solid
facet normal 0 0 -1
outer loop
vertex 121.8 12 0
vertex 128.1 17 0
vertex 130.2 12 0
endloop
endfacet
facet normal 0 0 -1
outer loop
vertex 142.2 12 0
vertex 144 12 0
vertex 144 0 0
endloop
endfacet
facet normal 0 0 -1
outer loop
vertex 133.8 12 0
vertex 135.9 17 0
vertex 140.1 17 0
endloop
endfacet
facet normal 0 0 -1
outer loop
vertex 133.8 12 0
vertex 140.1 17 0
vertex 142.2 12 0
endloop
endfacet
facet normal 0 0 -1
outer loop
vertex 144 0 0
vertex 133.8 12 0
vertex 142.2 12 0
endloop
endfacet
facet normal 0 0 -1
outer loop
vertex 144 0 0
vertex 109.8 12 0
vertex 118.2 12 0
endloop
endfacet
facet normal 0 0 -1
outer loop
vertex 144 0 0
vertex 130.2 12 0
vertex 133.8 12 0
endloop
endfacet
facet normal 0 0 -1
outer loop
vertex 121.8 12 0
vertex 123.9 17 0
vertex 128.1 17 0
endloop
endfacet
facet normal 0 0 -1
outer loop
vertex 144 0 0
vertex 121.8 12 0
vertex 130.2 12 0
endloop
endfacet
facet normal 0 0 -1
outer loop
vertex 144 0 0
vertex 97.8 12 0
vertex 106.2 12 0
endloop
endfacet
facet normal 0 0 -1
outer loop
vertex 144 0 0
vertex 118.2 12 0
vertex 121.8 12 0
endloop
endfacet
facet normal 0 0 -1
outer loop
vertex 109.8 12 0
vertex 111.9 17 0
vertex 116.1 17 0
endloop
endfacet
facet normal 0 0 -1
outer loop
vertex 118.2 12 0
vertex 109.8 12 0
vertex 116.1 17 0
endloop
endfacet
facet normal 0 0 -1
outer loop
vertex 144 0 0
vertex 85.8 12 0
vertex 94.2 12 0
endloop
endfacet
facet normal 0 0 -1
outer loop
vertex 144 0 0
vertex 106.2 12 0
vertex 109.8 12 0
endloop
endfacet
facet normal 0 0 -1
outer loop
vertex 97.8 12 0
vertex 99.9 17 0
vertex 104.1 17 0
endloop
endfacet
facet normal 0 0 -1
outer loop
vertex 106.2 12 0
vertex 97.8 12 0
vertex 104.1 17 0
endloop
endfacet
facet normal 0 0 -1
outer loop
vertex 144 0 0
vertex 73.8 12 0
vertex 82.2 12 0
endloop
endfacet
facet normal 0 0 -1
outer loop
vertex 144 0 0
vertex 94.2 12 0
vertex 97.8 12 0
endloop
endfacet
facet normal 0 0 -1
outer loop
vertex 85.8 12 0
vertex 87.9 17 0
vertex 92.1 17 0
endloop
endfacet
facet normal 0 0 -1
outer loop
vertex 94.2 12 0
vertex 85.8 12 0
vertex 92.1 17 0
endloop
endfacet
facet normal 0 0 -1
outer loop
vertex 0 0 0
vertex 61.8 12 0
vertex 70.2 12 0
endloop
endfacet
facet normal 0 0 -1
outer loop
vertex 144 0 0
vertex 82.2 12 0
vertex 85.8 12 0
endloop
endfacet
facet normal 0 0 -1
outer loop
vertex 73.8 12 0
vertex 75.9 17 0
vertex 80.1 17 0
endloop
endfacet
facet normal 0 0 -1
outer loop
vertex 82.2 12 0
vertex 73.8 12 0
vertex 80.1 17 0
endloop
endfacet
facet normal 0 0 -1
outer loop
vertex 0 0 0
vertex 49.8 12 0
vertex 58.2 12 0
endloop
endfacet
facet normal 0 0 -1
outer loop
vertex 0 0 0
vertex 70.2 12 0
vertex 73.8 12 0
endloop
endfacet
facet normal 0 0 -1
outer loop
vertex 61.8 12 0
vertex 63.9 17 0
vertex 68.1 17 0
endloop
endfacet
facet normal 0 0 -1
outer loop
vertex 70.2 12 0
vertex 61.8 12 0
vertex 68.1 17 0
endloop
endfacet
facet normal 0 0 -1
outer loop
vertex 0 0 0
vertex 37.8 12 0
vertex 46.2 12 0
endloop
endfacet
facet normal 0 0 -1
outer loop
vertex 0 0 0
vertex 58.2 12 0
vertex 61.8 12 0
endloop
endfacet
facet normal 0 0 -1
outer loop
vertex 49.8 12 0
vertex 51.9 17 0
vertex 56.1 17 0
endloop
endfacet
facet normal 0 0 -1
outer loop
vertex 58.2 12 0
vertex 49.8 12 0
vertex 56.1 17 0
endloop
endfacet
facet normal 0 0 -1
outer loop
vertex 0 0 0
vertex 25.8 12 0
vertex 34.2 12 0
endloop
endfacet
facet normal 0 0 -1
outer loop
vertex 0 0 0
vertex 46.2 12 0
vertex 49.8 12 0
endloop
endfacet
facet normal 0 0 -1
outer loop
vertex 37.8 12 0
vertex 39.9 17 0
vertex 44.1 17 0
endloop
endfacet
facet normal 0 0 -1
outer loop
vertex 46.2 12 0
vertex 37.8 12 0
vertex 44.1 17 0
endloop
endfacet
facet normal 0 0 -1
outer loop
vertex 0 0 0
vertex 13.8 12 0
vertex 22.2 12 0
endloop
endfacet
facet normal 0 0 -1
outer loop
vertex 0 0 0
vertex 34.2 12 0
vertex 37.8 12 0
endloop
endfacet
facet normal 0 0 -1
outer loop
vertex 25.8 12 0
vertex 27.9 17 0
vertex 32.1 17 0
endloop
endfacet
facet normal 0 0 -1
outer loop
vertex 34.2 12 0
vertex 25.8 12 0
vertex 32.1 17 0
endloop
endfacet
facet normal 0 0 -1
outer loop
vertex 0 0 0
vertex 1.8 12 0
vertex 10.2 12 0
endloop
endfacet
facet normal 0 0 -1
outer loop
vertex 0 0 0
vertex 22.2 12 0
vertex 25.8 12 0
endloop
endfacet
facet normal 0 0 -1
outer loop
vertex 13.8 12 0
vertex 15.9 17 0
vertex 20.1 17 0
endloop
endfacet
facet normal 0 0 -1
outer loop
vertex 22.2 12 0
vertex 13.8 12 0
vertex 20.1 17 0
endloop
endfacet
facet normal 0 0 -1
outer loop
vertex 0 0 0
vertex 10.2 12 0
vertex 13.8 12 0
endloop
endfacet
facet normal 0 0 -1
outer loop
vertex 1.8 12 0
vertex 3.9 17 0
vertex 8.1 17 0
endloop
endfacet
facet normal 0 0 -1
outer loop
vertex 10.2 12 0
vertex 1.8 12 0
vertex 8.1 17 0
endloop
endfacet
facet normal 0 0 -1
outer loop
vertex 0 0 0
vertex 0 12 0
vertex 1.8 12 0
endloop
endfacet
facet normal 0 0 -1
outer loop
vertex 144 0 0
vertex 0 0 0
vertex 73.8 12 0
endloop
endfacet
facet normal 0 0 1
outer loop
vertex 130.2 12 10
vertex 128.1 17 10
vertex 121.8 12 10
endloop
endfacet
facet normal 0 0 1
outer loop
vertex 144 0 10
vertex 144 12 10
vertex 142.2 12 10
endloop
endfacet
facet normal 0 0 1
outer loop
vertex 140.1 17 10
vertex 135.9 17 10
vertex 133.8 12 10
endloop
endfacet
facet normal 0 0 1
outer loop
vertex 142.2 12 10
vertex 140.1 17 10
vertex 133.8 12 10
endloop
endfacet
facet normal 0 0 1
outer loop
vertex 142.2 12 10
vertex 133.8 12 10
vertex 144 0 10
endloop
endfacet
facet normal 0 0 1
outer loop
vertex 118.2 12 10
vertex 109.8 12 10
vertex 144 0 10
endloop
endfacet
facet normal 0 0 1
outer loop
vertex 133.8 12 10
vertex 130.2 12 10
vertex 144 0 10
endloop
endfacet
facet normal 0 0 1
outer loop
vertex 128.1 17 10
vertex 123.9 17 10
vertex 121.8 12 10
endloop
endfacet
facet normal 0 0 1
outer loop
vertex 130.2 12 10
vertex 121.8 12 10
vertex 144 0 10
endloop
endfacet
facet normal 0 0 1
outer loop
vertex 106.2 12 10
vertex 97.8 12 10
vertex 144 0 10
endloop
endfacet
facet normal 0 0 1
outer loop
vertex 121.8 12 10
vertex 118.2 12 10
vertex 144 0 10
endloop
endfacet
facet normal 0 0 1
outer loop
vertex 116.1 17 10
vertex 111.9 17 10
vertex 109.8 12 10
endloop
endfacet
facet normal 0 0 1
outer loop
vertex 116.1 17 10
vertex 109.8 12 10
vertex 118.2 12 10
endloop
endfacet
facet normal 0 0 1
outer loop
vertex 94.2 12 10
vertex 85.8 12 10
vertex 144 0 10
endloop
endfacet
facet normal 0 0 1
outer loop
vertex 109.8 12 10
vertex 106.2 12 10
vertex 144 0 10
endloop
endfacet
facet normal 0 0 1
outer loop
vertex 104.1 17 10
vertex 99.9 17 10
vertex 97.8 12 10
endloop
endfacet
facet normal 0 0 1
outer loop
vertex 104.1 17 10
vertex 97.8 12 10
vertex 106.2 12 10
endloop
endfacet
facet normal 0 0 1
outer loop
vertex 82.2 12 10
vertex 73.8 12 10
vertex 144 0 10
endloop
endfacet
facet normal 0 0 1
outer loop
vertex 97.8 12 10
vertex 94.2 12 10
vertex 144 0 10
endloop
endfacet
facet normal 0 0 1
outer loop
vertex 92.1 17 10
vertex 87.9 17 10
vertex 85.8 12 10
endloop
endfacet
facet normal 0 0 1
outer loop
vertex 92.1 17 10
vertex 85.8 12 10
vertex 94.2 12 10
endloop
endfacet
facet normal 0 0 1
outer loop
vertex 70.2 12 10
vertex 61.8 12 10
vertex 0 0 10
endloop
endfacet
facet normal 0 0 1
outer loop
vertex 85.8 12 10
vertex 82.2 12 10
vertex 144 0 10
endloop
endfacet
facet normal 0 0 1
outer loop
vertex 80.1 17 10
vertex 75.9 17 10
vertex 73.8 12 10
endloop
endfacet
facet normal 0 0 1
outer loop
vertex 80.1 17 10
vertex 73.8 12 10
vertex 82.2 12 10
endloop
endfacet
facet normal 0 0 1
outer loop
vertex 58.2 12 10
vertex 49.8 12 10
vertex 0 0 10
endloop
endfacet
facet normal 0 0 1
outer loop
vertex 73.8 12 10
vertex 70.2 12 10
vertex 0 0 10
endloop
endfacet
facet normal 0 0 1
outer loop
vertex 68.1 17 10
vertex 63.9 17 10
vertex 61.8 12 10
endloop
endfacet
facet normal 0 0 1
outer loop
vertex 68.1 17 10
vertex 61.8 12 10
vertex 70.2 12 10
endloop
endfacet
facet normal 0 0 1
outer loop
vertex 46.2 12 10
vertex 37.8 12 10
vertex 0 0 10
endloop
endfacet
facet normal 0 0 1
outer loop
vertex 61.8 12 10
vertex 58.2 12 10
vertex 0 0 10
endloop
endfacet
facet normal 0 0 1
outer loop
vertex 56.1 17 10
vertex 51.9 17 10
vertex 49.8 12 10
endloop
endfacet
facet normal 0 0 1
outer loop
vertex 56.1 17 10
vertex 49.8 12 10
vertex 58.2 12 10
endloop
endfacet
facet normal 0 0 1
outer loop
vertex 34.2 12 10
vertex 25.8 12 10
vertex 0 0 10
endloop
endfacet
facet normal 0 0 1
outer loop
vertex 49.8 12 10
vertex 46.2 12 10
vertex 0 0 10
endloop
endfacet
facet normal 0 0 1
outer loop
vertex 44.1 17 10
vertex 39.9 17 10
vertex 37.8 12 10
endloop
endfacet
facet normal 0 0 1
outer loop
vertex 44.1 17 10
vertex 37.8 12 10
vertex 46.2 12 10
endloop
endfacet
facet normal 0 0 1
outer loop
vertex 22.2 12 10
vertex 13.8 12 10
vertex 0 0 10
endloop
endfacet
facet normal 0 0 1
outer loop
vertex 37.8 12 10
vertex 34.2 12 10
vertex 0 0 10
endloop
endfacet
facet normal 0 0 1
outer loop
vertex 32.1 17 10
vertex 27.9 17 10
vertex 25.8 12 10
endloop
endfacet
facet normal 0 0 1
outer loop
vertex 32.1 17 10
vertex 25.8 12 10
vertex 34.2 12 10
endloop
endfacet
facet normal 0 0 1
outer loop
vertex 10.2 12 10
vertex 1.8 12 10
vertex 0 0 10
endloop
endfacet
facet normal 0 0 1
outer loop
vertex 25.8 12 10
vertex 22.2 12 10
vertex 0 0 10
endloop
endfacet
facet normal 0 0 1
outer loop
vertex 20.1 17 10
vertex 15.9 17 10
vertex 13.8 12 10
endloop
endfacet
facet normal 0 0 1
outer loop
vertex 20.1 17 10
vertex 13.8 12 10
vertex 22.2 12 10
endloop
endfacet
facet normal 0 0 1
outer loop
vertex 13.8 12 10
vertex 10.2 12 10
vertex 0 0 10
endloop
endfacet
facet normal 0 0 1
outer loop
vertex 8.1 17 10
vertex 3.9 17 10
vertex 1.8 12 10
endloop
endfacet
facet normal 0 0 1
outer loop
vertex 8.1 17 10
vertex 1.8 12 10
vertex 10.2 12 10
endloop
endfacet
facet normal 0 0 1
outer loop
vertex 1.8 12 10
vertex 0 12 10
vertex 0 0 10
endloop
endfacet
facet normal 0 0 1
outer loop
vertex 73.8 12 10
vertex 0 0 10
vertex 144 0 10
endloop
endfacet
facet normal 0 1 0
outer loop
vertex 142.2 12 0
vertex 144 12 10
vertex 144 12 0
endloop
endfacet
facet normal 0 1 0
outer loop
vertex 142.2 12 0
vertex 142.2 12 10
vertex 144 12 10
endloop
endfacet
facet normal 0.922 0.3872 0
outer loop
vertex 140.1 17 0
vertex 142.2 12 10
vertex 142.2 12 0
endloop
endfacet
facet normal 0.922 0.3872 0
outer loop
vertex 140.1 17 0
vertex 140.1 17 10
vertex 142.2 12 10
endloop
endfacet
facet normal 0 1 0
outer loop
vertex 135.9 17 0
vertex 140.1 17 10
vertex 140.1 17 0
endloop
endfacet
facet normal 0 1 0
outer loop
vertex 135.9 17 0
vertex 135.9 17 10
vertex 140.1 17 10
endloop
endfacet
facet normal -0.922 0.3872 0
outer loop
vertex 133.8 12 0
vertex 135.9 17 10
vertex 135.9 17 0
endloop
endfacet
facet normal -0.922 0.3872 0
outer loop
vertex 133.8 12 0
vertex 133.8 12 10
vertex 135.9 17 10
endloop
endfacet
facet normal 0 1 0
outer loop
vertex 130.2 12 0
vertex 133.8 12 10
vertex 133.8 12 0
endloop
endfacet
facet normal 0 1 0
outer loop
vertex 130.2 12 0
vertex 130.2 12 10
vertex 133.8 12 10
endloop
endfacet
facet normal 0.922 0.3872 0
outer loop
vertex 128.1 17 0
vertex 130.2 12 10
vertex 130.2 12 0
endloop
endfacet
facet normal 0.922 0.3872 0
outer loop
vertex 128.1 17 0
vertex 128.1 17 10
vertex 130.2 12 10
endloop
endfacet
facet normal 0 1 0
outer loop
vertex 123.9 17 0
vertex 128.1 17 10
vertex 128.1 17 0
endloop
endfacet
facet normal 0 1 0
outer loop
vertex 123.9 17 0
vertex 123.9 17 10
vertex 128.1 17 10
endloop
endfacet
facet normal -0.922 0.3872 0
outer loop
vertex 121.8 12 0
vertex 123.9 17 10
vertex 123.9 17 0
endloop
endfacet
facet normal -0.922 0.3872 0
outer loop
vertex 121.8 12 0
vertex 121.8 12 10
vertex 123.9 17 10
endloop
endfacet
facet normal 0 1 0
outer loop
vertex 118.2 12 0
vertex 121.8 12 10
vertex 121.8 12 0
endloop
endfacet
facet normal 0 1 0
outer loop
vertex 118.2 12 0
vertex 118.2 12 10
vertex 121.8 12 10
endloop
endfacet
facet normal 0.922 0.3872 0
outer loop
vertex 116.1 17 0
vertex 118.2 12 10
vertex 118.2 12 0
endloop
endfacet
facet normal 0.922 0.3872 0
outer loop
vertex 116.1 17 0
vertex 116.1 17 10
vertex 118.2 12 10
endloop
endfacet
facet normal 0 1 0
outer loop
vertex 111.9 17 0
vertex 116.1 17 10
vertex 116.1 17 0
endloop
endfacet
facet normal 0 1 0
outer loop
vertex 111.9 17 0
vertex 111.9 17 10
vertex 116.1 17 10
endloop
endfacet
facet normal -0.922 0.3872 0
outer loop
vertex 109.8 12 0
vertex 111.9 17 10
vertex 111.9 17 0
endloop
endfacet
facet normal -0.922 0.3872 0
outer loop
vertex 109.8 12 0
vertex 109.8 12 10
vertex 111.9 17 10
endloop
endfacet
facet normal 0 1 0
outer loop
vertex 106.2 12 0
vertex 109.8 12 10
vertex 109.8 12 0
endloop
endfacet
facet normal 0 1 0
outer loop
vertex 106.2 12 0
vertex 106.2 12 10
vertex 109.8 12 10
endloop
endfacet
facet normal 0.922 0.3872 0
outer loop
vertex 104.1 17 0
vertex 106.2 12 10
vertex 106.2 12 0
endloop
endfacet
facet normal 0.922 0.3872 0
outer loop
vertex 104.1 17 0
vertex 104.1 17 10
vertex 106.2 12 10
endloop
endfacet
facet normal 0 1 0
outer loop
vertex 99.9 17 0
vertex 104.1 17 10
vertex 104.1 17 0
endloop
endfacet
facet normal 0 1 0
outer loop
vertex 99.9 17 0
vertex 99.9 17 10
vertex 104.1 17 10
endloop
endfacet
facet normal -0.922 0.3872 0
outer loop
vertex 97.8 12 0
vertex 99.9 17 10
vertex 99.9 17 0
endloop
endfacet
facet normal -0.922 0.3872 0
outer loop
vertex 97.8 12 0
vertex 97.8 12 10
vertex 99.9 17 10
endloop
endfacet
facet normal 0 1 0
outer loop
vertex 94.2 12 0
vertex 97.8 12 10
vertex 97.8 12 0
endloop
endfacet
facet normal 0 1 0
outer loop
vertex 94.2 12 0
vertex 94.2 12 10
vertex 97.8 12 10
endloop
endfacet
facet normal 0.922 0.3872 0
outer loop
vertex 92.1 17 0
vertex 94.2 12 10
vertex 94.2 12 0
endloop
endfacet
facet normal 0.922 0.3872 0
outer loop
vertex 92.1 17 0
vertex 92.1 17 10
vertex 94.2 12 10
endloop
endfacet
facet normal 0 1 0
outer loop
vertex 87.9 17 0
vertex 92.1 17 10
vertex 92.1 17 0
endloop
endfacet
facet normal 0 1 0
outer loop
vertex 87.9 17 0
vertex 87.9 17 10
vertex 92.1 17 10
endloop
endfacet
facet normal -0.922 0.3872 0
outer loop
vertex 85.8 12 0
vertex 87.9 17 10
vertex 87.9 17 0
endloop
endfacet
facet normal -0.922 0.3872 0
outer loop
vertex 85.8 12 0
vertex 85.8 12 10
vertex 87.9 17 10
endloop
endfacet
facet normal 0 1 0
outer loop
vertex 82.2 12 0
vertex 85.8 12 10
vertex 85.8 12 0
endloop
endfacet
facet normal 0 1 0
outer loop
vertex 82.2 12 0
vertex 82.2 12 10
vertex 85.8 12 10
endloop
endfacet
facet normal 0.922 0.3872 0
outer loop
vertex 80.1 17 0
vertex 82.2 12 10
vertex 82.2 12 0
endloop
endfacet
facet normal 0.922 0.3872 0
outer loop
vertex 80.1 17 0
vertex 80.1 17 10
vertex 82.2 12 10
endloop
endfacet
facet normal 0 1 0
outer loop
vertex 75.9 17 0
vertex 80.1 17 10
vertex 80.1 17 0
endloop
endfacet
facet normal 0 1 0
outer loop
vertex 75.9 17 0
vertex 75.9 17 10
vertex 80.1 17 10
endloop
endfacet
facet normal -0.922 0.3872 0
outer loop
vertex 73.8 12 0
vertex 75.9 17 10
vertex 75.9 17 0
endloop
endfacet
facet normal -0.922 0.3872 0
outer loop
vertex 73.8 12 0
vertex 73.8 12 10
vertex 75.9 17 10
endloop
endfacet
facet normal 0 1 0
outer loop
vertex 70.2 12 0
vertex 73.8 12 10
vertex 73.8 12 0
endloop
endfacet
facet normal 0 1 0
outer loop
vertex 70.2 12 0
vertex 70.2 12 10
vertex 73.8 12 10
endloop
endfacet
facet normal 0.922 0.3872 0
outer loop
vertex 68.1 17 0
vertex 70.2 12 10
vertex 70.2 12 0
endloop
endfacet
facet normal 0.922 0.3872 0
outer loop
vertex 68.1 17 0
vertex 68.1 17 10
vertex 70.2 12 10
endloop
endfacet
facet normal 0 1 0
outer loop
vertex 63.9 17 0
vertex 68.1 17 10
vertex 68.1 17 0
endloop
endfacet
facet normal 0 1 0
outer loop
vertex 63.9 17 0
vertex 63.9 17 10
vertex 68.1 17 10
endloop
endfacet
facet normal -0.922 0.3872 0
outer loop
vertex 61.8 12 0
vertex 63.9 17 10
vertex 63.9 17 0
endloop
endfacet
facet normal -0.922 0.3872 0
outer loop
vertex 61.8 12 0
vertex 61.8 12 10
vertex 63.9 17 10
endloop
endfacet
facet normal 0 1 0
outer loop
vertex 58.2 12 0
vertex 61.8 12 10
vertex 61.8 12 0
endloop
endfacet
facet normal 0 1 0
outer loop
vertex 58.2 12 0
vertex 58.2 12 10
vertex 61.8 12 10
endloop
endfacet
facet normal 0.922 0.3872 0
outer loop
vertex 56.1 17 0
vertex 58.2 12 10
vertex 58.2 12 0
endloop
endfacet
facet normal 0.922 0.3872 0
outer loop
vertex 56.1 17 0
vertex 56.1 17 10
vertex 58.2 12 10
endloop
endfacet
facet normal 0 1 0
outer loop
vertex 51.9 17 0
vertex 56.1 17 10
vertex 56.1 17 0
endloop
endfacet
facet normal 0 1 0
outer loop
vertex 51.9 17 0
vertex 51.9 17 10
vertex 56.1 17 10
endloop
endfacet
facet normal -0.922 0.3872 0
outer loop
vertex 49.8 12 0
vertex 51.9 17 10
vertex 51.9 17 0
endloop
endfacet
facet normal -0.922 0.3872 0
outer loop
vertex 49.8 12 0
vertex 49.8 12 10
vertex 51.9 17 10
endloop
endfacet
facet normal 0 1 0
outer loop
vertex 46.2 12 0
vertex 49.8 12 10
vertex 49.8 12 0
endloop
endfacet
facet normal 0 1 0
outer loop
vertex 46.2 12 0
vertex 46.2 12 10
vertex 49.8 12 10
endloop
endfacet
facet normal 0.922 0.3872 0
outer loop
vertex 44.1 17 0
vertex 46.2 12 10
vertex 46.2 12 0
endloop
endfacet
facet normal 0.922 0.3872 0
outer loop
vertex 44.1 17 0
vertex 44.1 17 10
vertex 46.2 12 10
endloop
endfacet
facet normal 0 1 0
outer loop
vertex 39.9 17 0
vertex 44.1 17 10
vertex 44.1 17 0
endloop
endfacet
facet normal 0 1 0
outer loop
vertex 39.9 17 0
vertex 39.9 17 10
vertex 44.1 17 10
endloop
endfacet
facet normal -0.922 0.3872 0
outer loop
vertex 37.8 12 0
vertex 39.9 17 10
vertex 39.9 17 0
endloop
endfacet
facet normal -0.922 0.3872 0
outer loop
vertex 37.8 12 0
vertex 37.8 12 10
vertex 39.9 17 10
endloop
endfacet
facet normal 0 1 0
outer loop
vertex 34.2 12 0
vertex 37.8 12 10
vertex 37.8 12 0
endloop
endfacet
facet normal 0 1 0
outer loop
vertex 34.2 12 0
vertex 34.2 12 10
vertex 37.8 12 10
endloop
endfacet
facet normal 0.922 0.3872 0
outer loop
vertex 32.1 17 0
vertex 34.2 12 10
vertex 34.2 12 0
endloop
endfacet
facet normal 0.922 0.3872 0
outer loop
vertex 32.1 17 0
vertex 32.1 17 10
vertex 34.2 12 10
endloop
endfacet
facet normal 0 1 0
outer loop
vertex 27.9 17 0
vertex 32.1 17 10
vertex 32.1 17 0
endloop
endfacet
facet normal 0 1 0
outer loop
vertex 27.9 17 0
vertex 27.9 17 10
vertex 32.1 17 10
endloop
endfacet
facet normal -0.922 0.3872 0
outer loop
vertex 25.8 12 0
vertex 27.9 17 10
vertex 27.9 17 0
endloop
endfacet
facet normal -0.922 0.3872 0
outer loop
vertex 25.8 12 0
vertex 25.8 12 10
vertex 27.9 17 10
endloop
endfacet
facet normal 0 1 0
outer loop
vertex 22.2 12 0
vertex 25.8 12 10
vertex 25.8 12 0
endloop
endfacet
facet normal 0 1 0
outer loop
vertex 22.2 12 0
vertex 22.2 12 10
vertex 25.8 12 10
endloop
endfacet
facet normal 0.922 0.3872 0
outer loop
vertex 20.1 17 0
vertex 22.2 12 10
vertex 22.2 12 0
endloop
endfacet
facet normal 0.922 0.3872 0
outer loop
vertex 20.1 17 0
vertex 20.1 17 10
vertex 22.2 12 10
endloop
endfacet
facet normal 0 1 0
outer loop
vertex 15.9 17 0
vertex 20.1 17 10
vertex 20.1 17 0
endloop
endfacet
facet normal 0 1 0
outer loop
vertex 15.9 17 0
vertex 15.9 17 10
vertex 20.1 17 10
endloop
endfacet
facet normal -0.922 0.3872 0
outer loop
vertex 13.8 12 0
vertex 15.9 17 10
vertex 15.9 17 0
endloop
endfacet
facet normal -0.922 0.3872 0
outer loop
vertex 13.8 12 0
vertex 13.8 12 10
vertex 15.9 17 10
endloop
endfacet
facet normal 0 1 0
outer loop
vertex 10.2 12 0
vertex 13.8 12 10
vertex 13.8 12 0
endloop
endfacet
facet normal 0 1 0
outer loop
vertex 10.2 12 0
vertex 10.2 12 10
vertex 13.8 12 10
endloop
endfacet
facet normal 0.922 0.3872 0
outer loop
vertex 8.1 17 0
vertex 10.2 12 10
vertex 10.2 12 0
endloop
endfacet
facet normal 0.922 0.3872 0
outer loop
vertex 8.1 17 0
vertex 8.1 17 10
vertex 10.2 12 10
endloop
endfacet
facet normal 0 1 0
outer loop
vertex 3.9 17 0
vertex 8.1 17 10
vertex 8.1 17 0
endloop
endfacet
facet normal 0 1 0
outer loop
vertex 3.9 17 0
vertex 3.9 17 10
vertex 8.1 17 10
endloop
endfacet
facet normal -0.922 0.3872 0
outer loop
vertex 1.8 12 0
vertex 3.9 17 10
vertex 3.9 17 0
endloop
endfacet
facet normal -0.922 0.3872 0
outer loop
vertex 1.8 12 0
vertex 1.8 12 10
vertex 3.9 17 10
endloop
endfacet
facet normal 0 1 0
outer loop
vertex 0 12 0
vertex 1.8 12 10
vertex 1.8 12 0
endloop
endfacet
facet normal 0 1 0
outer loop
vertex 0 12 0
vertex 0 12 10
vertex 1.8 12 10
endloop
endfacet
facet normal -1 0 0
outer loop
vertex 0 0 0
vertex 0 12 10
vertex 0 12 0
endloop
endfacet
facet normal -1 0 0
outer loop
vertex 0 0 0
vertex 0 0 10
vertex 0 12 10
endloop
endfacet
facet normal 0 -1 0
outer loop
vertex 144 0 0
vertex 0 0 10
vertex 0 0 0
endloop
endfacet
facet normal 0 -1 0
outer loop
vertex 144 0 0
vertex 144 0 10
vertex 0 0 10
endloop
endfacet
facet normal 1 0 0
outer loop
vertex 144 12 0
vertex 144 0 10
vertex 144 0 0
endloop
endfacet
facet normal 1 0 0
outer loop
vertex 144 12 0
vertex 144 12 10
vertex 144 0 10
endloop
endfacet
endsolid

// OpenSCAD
$fn = 32;

// ----------------------------------------------------------------------
// Gear rack: 12 teeth, pitch 12 mm
// ----------------------------------------------------------------------

// --- parameters (mm) ---
teeth = 12;               // number of teeth
pitch = 12;               // tooth pitch, X
root_w = 8.4;             // tooth width at the root
tip_w = 4.2;              // tooth width at the tip
base_h = 12;              // rack body height, Y
tooth_h = 5;              // tooth height above the body
plate_t = 10;             // rack width, Z (extrusion height)
fit_tol = 0.1;            // declared fit tolerance (prompt contract)
free_tol = 0.3;           // declared free tolerance (prompt contract)

rack_l = teeth * pitch;  // overall length
total_h = base_h + tooth_h;  // overall height

profile = [[0, 0], [144, 0], [144, 12], [142.2, 12], [140.1, 17], [135.9, 17], [133.8, 12], [130.2, 12], [128.1, 17], [123.9, 17], [121.8, 12], [118.2, 12], [116.1, 17], [111.9, 17], [109.8, 12], [106.2, 12], [104.1, 17], [99.9, 17], [97.8, 12], [94.2, 12], [92.1, 17], [87.9, 17], [85.8, 12], [82.2, 12], [80.1, 17], [75.9, 17], [73.8, 12], [70.2, 12], [68.1, 17], [63.9, 17], [61.8, 12], [58.2, 12], [56.1, 17], [51.9, 17], [49.8, 12], [46.2, 12], [44.1, 17], [39.9, 17], [37.8, 12], [34.2, 12], [32.1, 17], [27.9, 17], [25.8, 12], [22.2, 12], [20.1, 17], [15.9, 17], [13.8, 12], [10.2, 12], [8.1, 17], [3.9, 17], [1.8, 12], [0, 12]];  // primary outline, 52 points, counter clockwise

// --- the one profile operation ---
linear_extrude(height = plate_t) polygon(points = profile);
